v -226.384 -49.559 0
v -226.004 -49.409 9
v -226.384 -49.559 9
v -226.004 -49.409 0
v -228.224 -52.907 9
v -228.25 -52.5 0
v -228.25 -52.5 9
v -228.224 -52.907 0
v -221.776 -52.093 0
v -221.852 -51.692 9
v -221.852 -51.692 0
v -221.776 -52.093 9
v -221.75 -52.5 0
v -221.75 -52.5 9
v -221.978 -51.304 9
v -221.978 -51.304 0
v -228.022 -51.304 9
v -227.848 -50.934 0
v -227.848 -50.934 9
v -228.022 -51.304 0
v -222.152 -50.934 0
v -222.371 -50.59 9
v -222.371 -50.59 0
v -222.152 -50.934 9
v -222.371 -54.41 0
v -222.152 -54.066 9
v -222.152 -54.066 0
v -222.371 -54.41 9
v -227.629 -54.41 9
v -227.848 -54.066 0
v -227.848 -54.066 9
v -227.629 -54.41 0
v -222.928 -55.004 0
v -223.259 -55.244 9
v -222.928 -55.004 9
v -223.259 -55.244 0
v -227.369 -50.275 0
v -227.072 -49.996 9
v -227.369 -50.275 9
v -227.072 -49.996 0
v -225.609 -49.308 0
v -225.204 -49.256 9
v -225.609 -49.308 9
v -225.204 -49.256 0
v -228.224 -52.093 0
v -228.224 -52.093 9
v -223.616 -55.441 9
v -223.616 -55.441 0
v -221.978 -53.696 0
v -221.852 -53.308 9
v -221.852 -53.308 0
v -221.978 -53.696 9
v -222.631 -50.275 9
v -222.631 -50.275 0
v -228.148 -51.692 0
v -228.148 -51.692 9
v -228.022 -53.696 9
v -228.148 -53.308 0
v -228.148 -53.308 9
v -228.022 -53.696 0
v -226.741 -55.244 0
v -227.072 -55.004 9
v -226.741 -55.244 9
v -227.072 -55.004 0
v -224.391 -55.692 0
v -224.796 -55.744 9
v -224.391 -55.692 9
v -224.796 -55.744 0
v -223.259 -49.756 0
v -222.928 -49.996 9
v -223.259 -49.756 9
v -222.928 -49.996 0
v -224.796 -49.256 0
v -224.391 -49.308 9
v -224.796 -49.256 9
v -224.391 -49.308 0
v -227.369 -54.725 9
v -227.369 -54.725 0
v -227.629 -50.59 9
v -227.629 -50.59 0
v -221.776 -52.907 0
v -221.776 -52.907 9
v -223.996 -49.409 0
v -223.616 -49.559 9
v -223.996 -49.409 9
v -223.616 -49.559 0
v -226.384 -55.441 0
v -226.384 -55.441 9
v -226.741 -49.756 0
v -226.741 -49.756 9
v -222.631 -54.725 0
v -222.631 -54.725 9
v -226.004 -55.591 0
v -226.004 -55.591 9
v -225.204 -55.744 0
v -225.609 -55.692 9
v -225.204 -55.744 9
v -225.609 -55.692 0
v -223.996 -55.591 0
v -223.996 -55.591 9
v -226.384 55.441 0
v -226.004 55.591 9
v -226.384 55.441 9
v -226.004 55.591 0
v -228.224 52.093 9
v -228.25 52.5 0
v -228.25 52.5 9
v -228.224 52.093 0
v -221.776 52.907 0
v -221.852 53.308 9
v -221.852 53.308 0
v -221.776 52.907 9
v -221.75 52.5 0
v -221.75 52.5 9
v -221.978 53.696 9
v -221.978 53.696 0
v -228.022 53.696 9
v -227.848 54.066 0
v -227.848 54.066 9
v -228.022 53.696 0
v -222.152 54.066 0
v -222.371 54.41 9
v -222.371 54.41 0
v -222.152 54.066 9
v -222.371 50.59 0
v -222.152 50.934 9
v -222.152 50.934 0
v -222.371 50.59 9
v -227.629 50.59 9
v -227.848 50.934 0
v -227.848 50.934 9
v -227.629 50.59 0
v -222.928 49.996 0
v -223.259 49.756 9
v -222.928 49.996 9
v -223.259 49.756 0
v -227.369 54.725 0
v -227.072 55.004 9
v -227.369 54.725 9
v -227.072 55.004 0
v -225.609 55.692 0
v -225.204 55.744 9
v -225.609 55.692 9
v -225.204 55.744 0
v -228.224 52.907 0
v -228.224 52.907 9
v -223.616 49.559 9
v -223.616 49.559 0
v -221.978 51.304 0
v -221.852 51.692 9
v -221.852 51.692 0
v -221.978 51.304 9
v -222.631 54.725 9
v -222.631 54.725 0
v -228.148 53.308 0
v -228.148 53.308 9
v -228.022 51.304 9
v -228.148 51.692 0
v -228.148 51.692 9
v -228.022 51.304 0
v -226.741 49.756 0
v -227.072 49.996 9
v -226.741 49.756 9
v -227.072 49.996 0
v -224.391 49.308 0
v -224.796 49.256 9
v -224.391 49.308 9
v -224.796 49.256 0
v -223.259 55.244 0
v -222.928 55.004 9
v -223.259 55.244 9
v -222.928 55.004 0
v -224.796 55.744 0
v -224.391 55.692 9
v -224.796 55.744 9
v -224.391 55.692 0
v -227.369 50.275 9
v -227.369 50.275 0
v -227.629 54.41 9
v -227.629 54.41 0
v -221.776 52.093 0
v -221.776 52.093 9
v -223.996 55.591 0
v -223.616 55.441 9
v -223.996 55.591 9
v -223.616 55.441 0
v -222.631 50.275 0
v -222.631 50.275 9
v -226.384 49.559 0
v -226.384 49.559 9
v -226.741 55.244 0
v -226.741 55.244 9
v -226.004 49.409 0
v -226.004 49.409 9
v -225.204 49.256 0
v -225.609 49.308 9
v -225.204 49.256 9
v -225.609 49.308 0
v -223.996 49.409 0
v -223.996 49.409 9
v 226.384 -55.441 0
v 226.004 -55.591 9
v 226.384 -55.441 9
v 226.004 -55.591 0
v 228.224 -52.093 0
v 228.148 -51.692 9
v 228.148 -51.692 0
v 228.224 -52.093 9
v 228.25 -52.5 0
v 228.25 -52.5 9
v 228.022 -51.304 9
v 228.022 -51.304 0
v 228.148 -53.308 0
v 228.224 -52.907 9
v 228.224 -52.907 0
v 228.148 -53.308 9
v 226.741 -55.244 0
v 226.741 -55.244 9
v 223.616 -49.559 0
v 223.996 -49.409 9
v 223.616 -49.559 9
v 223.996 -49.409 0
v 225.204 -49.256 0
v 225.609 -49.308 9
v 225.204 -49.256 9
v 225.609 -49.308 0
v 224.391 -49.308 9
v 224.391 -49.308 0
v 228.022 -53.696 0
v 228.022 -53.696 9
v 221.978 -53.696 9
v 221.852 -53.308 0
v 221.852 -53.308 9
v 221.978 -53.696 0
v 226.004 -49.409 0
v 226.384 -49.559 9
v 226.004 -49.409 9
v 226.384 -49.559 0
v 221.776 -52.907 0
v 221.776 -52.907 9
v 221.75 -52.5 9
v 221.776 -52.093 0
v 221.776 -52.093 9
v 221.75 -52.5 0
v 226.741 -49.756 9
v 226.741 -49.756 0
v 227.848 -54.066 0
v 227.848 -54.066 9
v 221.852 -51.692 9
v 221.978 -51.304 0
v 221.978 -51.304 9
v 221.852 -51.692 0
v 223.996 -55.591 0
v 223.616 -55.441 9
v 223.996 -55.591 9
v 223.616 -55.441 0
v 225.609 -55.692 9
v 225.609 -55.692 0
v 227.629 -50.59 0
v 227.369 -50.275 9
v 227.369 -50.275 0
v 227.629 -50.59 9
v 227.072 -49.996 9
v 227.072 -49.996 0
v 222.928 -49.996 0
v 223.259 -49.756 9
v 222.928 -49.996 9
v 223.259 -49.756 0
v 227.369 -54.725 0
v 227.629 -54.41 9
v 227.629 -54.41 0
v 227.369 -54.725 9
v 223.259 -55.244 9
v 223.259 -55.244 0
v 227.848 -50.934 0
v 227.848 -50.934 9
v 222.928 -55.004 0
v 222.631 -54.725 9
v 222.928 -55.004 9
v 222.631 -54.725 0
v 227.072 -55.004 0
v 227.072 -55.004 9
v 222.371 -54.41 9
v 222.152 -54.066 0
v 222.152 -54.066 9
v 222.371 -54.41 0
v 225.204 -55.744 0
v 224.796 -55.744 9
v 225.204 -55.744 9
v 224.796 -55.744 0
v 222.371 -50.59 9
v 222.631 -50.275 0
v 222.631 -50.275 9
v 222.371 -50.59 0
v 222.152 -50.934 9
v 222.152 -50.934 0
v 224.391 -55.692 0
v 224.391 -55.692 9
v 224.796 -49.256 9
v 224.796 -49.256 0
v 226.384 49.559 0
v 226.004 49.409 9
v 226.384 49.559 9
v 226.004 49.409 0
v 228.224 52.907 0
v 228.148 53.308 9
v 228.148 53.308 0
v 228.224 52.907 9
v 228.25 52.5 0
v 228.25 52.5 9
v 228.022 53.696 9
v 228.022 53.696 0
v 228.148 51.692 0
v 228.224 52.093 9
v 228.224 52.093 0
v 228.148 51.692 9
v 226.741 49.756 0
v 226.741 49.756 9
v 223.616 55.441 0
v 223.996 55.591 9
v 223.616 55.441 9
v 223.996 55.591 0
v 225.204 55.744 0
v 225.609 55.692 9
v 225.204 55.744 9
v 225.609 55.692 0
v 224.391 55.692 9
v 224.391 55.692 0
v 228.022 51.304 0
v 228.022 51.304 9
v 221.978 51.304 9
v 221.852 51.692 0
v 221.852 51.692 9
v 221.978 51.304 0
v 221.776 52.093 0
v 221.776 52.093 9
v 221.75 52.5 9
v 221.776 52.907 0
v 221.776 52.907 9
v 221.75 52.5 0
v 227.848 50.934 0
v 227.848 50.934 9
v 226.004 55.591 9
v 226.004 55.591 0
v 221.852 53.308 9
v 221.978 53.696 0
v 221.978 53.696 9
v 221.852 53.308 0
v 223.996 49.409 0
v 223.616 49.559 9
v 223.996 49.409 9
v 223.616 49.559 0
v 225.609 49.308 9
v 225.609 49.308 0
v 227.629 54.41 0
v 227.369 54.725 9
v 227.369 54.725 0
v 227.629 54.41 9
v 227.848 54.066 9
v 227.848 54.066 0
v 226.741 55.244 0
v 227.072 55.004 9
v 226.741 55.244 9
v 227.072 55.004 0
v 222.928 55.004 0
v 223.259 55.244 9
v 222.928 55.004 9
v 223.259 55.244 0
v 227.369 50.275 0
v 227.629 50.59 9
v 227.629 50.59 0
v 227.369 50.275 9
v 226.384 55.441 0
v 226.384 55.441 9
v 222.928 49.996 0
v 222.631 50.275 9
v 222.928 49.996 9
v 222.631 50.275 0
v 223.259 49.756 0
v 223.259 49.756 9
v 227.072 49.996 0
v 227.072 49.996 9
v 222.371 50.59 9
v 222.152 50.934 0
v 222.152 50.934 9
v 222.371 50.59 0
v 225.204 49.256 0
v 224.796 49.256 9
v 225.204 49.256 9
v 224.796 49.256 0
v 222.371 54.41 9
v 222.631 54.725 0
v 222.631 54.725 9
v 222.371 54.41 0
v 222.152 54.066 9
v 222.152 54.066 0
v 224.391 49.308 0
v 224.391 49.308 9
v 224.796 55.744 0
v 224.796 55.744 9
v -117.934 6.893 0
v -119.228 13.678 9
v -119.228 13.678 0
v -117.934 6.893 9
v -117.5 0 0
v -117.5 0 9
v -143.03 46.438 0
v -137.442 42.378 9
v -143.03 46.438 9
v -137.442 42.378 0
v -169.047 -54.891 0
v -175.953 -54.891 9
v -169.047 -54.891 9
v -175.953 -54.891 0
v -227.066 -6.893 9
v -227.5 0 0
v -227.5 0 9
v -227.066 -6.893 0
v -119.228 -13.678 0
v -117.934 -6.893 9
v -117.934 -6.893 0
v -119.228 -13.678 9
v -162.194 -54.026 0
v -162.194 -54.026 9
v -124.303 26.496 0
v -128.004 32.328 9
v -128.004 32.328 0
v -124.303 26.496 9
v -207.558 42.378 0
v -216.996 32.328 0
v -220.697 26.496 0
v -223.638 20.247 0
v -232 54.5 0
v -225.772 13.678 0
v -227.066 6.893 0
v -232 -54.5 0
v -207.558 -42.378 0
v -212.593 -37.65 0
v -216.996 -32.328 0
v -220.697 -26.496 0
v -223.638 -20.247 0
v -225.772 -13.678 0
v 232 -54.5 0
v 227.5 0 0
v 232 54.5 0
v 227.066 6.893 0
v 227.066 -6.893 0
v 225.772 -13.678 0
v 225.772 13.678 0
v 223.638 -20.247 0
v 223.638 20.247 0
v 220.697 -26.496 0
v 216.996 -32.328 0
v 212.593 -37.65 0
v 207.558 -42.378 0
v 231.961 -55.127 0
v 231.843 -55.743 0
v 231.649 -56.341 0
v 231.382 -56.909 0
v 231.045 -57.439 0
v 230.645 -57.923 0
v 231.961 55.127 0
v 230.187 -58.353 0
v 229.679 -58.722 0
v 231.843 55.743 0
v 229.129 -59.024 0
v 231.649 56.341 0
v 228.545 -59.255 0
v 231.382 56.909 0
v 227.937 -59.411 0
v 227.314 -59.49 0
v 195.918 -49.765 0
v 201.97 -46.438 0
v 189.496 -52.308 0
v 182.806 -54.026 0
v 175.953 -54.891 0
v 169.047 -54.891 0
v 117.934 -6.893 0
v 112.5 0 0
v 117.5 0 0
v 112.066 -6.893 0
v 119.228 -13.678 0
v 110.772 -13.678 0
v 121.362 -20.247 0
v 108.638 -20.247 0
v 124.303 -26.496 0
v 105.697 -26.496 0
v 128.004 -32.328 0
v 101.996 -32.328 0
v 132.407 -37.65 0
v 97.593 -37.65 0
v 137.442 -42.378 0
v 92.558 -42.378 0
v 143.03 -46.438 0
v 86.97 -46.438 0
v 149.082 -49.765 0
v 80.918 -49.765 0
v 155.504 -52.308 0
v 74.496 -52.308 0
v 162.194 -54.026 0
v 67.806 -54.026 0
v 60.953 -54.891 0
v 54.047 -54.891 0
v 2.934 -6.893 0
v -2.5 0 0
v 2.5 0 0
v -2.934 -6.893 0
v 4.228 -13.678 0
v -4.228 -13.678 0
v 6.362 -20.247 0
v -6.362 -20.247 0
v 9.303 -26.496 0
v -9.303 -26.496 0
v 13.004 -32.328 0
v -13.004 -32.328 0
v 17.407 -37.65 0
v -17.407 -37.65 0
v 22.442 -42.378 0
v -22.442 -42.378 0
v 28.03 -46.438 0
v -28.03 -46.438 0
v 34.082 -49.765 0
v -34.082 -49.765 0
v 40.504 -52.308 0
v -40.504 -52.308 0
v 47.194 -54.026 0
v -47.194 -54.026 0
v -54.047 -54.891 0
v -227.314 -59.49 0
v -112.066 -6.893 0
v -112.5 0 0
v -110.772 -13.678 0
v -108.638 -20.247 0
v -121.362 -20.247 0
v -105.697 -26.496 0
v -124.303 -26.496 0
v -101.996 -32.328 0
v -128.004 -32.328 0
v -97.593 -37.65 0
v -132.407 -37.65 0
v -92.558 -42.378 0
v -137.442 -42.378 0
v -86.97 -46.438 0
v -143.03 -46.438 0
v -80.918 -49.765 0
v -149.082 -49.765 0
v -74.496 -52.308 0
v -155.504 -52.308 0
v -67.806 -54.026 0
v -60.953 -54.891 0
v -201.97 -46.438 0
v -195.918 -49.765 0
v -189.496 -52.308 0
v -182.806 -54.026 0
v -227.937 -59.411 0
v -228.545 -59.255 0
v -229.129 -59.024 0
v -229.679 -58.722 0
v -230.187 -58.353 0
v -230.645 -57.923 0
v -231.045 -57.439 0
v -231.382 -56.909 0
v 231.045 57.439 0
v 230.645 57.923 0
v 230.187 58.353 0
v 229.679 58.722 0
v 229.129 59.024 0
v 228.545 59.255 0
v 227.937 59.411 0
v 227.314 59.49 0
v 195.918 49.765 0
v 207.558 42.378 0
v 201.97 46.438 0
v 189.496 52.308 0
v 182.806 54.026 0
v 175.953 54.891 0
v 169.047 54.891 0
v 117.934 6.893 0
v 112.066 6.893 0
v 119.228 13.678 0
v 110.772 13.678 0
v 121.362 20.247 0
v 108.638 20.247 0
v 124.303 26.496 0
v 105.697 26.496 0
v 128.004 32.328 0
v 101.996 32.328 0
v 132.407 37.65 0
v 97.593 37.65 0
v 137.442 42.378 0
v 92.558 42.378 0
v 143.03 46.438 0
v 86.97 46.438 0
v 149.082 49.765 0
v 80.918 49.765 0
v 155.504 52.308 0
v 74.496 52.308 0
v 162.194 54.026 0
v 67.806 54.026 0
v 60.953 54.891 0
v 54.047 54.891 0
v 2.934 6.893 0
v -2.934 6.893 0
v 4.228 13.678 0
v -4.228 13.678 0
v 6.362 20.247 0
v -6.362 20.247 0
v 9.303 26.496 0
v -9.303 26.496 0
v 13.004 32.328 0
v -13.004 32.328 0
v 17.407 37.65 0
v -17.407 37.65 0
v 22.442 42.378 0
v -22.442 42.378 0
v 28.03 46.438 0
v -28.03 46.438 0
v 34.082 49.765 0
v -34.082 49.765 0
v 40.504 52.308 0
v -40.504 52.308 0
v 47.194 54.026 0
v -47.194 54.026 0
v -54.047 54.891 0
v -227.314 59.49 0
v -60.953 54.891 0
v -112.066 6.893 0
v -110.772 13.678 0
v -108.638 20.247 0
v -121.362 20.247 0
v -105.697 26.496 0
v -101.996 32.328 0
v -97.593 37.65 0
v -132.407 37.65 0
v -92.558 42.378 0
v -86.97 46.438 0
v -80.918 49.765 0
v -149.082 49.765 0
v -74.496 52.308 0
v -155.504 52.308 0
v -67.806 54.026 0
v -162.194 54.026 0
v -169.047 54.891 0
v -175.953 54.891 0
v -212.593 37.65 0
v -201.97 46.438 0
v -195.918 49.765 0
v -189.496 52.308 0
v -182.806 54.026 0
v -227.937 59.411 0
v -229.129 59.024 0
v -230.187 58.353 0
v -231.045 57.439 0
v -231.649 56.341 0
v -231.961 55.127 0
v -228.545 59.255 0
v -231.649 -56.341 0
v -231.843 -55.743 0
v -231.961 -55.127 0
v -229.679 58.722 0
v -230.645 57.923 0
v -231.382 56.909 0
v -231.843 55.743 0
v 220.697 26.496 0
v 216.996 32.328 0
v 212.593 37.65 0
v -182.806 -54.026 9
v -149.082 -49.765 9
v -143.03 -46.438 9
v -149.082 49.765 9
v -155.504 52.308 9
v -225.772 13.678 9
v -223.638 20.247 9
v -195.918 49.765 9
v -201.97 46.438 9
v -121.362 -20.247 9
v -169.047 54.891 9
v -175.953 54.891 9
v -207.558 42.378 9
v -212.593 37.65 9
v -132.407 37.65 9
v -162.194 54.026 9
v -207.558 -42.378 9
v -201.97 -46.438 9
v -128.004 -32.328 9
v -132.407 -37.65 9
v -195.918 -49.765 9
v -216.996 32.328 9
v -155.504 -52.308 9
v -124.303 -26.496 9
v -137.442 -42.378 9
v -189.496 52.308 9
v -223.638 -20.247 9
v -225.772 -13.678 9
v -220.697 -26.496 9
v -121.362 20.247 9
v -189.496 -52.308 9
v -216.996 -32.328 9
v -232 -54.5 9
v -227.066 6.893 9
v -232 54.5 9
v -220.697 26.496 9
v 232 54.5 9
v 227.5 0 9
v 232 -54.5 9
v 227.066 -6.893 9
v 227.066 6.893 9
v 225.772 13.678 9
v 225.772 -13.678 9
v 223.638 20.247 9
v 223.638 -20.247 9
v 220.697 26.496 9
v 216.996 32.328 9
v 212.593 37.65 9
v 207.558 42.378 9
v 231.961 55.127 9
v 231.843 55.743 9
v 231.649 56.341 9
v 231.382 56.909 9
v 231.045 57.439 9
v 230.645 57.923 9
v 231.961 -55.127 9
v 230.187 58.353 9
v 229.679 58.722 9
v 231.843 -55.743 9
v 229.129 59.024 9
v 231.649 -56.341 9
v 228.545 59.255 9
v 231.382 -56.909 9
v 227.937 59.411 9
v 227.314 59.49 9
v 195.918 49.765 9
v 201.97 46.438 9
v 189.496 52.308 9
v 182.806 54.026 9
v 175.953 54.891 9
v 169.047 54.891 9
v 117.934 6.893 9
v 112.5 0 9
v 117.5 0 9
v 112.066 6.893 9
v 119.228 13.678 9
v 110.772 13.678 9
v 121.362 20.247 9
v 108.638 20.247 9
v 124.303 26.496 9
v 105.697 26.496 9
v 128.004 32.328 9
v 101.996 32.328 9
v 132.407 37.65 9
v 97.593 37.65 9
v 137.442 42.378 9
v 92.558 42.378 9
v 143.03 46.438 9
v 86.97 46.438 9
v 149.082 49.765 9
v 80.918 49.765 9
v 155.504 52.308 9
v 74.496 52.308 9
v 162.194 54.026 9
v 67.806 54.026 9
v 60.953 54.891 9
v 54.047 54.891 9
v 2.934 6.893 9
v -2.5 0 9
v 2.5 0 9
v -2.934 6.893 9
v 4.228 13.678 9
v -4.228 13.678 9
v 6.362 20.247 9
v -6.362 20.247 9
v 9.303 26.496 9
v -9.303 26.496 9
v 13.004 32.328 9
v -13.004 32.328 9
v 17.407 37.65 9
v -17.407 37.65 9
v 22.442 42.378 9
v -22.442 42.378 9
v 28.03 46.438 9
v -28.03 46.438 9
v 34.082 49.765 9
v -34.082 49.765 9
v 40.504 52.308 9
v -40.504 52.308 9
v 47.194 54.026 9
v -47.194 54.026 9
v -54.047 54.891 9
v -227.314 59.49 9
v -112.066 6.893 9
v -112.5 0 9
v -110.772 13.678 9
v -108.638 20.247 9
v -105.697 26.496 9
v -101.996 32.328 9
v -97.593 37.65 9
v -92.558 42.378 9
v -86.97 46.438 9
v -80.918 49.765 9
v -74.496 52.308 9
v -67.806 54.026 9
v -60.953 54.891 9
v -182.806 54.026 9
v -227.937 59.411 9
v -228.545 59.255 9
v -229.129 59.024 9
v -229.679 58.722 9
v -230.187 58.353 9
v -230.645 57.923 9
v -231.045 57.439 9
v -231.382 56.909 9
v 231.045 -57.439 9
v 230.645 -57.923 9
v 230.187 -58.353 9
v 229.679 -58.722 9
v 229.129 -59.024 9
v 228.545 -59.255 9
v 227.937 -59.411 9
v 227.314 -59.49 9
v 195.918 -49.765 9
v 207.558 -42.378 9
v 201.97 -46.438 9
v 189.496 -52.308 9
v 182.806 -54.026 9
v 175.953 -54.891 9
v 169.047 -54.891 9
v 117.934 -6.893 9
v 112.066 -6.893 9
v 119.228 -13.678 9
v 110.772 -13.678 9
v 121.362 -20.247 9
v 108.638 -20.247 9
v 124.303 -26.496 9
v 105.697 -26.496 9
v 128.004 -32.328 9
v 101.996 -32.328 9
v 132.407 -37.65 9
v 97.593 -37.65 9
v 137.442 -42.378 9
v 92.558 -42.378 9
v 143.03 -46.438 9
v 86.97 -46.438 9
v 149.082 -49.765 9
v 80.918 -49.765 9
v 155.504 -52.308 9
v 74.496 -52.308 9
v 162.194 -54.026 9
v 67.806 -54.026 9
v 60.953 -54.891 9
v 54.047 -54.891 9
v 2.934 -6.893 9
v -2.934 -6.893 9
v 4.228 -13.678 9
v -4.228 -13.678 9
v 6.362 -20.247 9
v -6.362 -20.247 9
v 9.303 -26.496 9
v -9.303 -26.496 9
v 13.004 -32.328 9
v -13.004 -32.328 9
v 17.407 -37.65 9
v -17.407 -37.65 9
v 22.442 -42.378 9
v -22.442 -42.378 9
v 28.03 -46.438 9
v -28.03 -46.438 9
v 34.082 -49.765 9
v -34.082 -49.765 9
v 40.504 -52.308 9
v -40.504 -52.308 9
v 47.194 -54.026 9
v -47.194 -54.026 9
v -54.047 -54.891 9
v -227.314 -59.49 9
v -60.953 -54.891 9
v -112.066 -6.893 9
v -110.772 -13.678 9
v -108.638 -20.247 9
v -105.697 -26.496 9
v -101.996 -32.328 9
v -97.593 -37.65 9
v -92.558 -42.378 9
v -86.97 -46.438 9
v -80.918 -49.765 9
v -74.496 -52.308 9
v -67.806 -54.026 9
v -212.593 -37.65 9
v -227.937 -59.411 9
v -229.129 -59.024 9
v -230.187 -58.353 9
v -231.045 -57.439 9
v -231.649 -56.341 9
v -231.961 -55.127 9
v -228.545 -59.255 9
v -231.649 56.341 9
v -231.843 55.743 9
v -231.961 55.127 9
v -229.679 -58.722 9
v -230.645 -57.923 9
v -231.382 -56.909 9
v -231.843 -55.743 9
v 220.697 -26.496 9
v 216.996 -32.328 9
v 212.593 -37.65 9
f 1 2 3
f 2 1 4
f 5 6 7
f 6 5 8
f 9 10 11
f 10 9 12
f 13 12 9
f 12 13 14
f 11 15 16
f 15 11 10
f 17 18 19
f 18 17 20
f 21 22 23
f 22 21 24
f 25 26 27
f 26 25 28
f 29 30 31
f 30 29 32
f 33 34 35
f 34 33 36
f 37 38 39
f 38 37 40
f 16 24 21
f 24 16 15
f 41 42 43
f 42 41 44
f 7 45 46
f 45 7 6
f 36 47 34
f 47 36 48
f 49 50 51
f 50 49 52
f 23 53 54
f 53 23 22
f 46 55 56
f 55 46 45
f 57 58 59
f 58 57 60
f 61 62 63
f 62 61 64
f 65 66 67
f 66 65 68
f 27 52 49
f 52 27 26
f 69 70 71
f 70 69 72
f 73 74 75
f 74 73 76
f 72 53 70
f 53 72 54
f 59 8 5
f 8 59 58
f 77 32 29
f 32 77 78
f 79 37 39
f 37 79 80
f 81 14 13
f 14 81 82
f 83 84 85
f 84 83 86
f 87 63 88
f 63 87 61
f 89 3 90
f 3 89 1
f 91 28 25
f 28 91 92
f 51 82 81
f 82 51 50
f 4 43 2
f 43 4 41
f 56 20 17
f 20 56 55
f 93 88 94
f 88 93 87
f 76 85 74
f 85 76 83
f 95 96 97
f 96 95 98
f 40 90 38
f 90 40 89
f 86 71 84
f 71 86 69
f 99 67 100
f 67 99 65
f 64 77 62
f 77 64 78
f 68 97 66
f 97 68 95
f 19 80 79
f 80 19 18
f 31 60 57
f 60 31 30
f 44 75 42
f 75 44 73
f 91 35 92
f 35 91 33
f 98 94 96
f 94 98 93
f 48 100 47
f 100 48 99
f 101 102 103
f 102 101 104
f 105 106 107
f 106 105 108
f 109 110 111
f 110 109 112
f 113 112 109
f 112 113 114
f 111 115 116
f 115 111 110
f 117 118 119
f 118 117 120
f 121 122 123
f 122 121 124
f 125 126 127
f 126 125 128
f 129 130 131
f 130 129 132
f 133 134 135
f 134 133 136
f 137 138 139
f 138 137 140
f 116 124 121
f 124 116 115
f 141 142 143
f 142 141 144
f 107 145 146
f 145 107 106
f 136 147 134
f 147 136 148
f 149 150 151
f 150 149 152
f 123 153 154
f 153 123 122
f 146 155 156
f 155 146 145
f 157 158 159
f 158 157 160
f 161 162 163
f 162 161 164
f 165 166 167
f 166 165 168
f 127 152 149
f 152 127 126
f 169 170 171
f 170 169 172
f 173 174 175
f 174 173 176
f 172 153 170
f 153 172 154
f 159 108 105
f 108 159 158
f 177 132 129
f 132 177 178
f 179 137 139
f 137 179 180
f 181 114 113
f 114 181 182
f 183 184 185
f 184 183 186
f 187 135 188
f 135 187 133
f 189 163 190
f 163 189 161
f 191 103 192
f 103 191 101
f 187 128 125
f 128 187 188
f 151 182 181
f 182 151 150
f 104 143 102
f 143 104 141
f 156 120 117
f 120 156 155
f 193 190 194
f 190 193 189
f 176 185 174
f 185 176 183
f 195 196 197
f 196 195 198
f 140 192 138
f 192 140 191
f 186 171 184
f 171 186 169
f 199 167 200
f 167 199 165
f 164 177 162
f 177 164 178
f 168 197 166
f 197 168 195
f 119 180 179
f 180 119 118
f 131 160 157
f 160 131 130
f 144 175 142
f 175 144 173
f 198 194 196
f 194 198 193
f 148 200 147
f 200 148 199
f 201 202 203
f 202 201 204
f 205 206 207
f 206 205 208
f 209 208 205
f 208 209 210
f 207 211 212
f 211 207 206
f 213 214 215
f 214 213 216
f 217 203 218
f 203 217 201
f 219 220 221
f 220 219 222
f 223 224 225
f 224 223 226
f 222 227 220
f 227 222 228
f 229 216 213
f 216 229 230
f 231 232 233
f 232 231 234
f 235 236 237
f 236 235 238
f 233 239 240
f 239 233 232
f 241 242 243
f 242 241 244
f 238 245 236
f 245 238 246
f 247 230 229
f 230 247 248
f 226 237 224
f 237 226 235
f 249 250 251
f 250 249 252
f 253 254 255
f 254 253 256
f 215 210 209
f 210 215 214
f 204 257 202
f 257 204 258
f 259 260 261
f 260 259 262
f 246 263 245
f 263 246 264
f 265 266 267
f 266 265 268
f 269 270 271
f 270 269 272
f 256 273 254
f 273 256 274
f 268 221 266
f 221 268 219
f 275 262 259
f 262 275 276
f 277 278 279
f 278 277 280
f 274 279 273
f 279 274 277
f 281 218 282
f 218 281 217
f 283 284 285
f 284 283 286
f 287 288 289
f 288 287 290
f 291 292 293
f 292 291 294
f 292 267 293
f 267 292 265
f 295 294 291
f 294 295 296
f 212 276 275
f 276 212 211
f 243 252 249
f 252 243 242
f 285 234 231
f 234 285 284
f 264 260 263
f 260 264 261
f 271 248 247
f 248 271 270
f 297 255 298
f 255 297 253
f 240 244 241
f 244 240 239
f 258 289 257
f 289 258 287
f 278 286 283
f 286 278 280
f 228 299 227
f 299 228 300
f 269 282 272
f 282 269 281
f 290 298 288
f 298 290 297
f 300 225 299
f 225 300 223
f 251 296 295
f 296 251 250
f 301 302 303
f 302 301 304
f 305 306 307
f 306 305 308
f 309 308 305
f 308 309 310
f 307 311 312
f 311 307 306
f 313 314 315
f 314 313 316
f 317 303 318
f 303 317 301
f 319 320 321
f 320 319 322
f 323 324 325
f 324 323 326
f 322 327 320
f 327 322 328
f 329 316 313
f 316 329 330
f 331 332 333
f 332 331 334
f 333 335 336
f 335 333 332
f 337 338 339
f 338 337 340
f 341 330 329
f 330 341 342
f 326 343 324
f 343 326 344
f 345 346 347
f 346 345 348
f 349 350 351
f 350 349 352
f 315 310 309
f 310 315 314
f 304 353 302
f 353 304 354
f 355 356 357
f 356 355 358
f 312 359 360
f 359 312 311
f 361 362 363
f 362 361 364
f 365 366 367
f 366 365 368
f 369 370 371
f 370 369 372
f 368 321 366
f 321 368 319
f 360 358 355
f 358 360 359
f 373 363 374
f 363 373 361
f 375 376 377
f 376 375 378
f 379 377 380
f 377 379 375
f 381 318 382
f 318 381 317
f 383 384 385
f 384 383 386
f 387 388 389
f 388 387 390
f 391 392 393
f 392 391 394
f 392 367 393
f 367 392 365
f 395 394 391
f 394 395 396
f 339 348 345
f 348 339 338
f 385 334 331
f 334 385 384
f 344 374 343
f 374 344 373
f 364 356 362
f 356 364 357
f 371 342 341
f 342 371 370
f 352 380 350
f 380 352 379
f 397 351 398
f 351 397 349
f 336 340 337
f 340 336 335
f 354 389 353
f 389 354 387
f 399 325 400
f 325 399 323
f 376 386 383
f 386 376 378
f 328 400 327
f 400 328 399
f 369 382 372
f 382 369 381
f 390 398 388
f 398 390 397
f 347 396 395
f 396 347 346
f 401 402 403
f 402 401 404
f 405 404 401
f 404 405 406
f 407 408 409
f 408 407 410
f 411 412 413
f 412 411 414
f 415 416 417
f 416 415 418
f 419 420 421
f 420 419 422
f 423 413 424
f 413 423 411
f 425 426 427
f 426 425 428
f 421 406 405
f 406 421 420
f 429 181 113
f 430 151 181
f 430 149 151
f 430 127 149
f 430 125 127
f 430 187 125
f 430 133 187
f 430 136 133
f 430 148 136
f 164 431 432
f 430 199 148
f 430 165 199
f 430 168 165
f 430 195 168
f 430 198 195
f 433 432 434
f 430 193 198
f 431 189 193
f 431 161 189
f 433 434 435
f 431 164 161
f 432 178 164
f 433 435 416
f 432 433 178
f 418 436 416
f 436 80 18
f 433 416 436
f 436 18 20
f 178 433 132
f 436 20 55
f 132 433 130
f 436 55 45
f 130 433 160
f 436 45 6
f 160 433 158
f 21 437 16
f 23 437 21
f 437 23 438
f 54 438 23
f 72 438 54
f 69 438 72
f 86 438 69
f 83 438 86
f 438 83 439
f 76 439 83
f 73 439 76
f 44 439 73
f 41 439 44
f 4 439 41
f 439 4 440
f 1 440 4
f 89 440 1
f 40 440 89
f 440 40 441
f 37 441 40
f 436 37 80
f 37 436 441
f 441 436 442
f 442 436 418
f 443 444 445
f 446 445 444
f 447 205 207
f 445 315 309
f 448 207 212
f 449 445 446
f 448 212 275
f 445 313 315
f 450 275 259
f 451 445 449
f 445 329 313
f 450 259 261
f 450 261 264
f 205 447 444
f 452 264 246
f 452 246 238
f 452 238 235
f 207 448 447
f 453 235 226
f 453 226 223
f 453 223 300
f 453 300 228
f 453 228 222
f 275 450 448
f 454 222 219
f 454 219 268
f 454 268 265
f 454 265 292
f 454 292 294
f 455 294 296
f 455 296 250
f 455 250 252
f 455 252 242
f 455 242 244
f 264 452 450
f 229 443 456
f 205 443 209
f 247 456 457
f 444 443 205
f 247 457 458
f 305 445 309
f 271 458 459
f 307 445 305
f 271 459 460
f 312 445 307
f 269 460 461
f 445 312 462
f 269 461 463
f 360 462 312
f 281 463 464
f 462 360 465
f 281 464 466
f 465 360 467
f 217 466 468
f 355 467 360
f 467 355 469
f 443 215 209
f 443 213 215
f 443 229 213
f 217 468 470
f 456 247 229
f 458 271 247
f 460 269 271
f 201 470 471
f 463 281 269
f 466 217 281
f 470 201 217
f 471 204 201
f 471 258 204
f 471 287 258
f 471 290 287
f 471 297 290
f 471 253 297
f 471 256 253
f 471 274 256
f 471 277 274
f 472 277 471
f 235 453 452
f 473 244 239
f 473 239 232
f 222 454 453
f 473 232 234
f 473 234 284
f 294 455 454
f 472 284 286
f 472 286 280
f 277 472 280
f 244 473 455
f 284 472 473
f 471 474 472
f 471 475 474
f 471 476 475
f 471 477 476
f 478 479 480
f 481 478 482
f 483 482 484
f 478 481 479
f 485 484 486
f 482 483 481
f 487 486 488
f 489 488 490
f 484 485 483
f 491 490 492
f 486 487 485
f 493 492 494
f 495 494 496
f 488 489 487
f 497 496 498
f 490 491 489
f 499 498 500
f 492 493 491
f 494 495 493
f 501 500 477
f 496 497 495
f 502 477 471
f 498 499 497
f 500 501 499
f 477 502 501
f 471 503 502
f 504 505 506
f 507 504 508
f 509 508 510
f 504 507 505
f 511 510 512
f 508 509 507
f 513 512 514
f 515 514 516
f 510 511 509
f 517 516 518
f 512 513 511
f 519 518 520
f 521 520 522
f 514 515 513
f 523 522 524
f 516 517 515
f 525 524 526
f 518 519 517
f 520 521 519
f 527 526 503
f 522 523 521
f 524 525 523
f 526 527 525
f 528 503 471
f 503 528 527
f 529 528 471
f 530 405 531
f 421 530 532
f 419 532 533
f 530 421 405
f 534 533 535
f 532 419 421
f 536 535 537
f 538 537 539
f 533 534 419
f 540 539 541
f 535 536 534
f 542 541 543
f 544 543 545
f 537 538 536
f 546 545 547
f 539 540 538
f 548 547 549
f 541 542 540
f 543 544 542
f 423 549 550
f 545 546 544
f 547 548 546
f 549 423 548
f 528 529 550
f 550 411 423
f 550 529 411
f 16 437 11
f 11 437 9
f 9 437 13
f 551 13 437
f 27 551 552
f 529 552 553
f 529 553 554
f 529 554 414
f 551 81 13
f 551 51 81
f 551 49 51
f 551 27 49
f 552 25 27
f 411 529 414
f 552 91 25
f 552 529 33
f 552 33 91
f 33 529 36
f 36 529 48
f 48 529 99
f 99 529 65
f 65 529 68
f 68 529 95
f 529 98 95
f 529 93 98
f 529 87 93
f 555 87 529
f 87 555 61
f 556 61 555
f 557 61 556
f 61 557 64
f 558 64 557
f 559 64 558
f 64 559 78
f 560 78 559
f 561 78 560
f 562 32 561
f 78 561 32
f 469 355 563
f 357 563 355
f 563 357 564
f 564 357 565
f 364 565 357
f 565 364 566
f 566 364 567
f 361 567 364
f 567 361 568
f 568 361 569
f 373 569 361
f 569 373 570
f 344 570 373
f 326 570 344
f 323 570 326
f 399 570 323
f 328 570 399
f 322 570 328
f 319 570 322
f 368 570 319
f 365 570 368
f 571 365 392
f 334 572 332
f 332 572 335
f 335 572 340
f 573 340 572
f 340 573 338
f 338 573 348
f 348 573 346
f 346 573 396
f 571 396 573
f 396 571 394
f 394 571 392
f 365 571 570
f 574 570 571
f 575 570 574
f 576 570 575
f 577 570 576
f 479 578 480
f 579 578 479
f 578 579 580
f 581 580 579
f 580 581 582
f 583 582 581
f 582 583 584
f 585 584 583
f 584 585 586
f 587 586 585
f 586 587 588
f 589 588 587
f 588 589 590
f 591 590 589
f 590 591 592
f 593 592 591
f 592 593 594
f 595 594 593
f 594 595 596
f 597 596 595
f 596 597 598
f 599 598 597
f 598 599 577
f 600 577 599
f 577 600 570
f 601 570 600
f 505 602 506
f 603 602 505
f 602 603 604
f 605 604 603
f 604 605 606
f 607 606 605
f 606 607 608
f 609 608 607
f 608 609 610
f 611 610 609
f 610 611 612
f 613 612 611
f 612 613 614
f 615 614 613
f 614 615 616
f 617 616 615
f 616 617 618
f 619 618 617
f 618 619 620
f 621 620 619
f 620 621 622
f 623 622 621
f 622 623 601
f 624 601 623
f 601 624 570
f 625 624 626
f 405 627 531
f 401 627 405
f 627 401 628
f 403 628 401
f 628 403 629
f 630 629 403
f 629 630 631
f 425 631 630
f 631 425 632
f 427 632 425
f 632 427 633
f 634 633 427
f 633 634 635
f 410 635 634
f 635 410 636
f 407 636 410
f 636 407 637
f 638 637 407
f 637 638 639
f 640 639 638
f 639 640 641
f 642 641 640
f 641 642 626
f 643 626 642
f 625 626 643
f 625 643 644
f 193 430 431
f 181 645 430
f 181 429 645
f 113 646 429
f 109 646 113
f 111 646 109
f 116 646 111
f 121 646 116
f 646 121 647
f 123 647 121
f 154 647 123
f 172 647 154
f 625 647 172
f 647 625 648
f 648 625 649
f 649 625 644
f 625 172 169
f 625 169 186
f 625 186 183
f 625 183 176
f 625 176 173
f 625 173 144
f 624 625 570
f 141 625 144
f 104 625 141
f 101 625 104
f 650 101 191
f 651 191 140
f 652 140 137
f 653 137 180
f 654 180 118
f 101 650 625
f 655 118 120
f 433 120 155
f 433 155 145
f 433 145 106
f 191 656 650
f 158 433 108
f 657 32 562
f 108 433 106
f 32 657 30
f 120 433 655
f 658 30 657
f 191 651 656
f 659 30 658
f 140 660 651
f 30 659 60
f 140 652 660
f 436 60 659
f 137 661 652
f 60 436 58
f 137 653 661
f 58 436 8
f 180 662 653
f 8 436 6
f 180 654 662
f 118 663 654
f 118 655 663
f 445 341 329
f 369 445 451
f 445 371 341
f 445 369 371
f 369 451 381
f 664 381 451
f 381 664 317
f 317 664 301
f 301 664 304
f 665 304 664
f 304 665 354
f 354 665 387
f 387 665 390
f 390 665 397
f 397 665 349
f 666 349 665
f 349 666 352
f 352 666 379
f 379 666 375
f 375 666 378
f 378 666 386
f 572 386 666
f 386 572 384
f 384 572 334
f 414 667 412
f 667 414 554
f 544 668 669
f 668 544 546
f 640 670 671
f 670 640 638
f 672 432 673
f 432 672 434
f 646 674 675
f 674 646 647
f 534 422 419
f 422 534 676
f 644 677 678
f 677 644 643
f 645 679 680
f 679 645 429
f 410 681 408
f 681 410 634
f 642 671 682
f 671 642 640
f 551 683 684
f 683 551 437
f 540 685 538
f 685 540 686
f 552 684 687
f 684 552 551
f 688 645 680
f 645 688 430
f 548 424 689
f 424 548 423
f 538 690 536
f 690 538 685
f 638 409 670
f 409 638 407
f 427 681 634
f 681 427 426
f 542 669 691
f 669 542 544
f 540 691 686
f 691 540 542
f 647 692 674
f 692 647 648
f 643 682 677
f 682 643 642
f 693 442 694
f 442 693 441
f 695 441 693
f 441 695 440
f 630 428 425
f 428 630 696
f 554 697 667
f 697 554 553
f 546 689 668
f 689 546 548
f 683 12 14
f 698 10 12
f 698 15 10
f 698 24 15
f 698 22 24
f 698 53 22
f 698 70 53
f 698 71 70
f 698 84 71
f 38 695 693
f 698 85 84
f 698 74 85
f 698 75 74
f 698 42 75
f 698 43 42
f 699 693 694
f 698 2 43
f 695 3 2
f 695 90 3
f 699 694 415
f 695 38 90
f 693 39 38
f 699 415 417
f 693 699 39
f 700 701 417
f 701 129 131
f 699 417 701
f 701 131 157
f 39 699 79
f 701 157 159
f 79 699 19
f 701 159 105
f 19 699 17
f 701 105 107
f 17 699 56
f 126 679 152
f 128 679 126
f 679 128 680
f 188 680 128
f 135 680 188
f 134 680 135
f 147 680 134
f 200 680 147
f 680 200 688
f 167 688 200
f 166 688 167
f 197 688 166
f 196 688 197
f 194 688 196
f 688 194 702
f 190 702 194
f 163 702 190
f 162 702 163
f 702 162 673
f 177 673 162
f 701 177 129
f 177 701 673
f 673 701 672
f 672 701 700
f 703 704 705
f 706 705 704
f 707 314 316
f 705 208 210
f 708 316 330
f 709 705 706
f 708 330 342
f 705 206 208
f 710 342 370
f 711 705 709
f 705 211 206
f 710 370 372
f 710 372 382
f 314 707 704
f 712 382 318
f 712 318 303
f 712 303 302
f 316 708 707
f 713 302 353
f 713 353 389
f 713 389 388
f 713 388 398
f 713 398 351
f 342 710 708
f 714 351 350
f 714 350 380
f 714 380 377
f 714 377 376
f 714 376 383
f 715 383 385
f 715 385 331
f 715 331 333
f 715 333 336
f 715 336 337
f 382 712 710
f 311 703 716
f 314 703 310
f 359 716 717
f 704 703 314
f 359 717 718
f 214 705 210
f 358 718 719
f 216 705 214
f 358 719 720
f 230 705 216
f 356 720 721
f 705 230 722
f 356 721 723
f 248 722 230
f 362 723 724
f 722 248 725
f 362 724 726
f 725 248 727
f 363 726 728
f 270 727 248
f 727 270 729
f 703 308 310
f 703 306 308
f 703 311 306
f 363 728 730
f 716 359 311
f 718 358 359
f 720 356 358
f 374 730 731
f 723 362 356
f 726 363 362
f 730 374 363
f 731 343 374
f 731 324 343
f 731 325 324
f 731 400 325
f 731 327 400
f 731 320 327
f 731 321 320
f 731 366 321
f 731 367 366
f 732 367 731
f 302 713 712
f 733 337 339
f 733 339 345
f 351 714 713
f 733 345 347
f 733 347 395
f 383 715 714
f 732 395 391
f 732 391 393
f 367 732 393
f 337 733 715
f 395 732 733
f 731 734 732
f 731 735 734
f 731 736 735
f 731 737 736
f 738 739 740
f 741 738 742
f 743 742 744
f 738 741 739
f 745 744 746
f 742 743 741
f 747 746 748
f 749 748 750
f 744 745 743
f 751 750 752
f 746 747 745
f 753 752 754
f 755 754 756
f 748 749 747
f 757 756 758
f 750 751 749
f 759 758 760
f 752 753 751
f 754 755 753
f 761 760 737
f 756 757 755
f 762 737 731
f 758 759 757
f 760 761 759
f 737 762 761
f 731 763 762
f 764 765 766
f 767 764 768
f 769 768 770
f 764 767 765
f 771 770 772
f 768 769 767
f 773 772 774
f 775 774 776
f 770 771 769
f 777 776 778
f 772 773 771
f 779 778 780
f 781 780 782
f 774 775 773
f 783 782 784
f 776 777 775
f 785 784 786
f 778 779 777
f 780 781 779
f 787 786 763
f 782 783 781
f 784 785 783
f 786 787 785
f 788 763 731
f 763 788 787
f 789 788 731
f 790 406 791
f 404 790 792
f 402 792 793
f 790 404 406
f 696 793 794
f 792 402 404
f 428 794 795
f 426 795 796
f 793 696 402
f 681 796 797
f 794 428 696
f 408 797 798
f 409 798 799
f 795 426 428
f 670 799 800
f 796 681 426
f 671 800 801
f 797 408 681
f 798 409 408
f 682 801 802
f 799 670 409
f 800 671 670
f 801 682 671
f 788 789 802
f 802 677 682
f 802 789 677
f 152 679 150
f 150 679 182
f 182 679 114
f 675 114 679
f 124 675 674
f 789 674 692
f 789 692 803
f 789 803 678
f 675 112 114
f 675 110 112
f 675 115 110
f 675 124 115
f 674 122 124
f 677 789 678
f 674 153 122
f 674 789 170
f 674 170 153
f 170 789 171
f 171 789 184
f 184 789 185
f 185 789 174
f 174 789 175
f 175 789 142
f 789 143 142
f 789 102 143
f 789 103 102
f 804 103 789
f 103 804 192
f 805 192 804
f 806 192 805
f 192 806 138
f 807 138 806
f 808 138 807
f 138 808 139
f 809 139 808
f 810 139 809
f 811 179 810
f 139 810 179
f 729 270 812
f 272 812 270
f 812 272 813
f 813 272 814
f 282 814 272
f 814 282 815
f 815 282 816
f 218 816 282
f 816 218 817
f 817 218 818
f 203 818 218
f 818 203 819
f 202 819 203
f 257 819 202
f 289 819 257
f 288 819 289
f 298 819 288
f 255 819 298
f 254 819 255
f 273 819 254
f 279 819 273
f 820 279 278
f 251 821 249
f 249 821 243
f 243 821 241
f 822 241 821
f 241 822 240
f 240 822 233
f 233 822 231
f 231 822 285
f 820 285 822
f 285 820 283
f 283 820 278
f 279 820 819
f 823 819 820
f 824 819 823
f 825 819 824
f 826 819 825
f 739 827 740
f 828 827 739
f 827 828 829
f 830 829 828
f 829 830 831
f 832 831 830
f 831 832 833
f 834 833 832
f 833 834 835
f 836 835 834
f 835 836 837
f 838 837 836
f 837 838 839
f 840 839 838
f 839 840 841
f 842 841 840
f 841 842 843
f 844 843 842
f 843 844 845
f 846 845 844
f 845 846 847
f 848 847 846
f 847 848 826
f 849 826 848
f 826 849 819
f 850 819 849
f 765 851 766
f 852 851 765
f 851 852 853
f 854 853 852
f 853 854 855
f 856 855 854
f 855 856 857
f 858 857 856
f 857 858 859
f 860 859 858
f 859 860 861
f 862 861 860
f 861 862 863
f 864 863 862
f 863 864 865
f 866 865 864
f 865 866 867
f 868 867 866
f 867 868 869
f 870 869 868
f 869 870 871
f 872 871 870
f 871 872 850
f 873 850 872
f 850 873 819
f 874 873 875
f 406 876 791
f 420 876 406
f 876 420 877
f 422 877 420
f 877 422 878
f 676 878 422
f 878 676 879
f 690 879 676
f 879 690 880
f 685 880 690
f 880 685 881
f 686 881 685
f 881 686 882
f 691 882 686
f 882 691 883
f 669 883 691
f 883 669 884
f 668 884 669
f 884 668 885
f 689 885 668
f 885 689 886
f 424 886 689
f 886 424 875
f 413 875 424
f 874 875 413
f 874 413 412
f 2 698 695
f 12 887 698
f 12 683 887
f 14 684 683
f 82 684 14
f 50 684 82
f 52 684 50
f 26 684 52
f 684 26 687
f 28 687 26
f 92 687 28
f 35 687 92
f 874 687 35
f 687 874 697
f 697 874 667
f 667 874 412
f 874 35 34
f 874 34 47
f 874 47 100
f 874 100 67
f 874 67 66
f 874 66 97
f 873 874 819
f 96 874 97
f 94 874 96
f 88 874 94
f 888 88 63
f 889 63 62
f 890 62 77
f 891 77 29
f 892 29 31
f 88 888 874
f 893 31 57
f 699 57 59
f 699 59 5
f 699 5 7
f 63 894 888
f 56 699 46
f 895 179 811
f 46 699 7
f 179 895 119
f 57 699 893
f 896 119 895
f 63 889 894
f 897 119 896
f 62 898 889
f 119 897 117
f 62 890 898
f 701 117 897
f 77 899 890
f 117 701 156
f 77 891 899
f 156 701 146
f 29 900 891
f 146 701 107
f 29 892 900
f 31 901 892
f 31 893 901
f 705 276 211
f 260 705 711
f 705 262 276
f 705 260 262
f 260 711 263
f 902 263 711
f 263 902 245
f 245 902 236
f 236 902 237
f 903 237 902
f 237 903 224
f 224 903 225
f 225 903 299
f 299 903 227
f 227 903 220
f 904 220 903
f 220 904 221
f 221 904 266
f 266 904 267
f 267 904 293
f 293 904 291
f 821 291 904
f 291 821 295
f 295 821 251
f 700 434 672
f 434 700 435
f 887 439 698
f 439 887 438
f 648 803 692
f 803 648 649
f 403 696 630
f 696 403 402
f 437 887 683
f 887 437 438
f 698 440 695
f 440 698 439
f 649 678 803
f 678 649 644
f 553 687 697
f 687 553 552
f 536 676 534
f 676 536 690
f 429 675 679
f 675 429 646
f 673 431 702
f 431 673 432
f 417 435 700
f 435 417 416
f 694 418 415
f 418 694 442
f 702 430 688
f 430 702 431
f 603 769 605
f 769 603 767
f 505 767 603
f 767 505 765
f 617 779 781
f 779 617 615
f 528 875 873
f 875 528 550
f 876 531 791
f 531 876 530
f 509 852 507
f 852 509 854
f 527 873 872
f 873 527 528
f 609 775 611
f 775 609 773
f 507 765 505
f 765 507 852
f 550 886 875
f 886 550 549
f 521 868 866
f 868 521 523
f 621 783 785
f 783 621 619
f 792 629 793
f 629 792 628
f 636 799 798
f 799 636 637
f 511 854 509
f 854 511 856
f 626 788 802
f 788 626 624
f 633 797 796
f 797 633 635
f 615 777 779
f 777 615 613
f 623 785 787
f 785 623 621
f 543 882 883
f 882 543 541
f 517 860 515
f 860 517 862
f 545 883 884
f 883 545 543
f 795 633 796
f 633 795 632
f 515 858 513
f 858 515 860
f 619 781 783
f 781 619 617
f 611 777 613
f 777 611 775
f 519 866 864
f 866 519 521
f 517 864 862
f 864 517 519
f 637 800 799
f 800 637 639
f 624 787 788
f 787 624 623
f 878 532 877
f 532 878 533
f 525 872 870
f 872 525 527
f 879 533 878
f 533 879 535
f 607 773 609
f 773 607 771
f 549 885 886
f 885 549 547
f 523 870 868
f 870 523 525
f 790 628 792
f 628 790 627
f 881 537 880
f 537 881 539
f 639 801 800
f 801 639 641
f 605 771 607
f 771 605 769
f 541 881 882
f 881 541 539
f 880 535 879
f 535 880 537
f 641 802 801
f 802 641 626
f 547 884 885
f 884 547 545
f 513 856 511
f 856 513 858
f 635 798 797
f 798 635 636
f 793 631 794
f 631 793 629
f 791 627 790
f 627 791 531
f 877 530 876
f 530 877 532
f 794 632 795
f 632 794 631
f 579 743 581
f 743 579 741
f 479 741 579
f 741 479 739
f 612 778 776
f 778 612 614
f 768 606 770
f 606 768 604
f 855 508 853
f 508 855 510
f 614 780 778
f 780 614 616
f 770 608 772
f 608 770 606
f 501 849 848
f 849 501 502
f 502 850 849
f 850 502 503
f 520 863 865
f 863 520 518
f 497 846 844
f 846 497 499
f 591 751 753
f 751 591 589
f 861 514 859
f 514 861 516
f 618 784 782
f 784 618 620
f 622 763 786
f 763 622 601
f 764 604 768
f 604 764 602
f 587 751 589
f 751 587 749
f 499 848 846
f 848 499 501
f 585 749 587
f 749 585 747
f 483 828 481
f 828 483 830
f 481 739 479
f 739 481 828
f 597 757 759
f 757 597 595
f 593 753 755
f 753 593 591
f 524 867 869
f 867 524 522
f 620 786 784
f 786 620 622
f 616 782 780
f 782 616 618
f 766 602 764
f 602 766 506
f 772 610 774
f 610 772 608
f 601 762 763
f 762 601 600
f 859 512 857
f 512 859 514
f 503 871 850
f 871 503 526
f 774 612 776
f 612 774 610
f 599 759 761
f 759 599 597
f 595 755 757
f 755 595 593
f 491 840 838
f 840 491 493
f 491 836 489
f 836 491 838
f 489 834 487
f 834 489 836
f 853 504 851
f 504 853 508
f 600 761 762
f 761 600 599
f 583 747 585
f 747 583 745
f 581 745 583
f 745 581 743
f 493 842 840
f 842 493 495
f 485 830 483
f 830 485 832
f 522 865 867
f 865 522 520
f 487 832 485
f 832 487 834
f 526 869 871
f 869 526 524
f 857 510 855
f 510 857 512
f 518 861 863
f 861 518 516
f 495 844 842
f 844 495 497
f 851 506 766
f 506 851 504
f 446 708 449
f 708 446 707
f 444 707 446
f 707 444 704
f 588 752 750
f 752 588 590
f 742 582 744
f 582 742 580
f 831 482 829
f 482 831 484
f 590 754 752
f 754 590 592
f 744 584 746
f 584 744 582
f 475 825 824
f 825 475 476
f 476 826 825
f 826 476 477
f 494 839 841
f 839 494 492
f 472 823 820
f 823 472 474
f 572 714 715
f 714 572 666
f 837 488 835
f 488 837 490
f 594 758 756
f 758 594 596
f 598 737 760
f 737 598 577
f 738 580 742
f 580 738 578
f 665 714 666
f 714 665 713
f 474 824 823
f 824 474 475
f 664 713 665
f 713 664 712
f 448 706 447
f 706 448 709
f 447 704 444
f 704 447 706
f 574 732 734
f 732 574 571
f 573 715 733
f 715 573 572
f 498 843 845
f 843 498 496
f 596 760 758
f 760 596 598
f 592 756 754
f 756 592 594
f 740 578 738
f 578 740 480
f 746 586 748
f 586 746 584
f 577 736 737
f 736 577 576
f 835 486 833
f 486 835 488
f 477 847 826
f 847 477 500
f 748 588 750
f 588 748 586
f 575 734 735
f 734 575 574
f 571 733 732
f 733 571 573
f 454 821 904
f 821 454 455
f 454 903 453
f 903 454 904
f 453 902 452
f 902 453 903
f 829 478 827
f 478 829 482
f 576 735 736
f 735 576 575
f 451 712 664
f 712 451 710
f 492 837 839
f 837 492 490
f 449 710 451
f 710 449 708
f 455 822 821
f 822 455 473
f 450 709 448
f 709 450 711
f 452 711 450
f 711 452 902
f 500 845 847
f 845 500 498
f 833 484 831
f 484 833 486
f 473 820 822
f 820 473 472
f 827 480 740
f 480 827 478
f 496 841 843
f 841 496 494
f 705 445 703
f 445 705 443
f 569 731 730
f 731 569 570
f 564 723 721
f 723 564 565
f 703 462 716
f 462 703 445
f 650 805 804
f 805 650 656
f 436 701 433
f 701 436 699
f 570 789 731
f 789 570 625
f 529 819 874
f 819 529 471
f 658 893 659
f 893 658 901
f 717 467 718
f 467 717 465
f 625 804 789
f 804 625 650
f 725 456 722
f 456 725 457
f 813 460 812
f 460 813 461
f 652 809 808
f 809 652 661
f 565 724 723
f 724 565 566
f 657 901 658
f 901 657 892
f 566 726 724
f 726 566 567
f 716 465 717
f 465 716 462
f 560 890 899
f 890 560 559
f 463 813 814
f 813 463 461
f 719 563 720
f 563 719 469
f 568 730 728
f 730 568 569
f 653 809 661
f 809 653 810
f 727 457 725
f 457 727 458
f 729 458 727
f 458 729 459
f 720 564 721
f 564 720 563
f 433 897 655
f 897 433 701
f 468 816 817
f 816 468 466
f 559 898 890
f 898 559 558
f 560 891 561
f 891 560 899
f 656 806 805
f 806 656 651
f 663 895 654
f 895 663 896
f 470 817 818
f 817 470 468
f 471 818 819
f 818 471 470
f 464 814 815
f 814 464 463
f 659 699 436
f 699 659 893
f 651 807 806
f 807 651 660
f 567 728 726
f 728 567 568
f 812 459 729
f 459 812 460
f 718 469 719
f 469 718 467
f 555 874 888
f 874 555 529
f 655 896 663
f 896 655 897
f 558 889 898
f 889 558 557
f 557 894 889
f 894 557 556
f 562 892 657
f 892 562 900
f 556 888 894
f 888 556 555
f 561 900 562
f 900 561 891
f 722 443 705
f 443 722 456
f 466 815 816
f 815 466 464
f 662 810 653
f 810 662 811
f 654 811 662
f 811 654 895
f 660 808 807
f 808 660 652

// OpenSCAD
$fn = 50;

difference() {
	union() {
		hull() {
			translate(v = [-227.0, 54.5, 0]) {
				cylinder(h = 9, r = 5);
			}
			translate(v = [227.0, 54.5, 0]) {
				cylinder(h = 9, r = 5);
			}
			translate(v = [-227.0, -54.5, 0]) {
				cylinder(h = 9, r = 5);
			}
			translate(v = [227.0, -54.5, 0]) {
				cylinder(h = 9, r = 5);
			}
		}
	}
	union() {
		translate(v = [-225.0, -52.5, -100.0]) {
			cylinder(h = 200, r = 3.25);
		}
		translate(v = [-225.0, 52.5, -100.0]) {
			cylinder(h = 200, r = 3.25);
		}
		translate(v = [225.0, -52.5, -100.0]) {
			cylinder(h = 200, r = 3.25);
		}
		translate(v = [225.0, 52.5, -100.0]) {
			cylinder(h = 200, r = 3.25);
		}
		translate(v = [-225.0, -52.5, -100.0]) {
			cylinder(h = 200, r = 1.8);
		}
		translate(v = [-225.0, 52.5, -100.0]) {
			cylinder(h = 200, r = 1.8);
		}
		translate(v = [225.0, -52.5, -100.0]) {
			cylinder(h = 200, r = 1.8);
		}
		translate(v = [225.0, 52.5, -100.0]) {
			cylinder(h = 200, r = 1.8);
		}
		translate(v = [-172.5, 0, 0.0]) {
			cylinder(h = 9, r = 55.0);
		}
		translate(v = [-57.5, 0, 0.0]) {
			cylinder(h = 9, r = 55.0);
		}
		translate(v = [57.5, 0, 0.0]) {
			cylinder(h = 9, r = 55.0);
		}
		translate(v = [172.5, 0, 0.0]) {
			cylinder(h = 9, r = 55.0);
		}
	}
}
